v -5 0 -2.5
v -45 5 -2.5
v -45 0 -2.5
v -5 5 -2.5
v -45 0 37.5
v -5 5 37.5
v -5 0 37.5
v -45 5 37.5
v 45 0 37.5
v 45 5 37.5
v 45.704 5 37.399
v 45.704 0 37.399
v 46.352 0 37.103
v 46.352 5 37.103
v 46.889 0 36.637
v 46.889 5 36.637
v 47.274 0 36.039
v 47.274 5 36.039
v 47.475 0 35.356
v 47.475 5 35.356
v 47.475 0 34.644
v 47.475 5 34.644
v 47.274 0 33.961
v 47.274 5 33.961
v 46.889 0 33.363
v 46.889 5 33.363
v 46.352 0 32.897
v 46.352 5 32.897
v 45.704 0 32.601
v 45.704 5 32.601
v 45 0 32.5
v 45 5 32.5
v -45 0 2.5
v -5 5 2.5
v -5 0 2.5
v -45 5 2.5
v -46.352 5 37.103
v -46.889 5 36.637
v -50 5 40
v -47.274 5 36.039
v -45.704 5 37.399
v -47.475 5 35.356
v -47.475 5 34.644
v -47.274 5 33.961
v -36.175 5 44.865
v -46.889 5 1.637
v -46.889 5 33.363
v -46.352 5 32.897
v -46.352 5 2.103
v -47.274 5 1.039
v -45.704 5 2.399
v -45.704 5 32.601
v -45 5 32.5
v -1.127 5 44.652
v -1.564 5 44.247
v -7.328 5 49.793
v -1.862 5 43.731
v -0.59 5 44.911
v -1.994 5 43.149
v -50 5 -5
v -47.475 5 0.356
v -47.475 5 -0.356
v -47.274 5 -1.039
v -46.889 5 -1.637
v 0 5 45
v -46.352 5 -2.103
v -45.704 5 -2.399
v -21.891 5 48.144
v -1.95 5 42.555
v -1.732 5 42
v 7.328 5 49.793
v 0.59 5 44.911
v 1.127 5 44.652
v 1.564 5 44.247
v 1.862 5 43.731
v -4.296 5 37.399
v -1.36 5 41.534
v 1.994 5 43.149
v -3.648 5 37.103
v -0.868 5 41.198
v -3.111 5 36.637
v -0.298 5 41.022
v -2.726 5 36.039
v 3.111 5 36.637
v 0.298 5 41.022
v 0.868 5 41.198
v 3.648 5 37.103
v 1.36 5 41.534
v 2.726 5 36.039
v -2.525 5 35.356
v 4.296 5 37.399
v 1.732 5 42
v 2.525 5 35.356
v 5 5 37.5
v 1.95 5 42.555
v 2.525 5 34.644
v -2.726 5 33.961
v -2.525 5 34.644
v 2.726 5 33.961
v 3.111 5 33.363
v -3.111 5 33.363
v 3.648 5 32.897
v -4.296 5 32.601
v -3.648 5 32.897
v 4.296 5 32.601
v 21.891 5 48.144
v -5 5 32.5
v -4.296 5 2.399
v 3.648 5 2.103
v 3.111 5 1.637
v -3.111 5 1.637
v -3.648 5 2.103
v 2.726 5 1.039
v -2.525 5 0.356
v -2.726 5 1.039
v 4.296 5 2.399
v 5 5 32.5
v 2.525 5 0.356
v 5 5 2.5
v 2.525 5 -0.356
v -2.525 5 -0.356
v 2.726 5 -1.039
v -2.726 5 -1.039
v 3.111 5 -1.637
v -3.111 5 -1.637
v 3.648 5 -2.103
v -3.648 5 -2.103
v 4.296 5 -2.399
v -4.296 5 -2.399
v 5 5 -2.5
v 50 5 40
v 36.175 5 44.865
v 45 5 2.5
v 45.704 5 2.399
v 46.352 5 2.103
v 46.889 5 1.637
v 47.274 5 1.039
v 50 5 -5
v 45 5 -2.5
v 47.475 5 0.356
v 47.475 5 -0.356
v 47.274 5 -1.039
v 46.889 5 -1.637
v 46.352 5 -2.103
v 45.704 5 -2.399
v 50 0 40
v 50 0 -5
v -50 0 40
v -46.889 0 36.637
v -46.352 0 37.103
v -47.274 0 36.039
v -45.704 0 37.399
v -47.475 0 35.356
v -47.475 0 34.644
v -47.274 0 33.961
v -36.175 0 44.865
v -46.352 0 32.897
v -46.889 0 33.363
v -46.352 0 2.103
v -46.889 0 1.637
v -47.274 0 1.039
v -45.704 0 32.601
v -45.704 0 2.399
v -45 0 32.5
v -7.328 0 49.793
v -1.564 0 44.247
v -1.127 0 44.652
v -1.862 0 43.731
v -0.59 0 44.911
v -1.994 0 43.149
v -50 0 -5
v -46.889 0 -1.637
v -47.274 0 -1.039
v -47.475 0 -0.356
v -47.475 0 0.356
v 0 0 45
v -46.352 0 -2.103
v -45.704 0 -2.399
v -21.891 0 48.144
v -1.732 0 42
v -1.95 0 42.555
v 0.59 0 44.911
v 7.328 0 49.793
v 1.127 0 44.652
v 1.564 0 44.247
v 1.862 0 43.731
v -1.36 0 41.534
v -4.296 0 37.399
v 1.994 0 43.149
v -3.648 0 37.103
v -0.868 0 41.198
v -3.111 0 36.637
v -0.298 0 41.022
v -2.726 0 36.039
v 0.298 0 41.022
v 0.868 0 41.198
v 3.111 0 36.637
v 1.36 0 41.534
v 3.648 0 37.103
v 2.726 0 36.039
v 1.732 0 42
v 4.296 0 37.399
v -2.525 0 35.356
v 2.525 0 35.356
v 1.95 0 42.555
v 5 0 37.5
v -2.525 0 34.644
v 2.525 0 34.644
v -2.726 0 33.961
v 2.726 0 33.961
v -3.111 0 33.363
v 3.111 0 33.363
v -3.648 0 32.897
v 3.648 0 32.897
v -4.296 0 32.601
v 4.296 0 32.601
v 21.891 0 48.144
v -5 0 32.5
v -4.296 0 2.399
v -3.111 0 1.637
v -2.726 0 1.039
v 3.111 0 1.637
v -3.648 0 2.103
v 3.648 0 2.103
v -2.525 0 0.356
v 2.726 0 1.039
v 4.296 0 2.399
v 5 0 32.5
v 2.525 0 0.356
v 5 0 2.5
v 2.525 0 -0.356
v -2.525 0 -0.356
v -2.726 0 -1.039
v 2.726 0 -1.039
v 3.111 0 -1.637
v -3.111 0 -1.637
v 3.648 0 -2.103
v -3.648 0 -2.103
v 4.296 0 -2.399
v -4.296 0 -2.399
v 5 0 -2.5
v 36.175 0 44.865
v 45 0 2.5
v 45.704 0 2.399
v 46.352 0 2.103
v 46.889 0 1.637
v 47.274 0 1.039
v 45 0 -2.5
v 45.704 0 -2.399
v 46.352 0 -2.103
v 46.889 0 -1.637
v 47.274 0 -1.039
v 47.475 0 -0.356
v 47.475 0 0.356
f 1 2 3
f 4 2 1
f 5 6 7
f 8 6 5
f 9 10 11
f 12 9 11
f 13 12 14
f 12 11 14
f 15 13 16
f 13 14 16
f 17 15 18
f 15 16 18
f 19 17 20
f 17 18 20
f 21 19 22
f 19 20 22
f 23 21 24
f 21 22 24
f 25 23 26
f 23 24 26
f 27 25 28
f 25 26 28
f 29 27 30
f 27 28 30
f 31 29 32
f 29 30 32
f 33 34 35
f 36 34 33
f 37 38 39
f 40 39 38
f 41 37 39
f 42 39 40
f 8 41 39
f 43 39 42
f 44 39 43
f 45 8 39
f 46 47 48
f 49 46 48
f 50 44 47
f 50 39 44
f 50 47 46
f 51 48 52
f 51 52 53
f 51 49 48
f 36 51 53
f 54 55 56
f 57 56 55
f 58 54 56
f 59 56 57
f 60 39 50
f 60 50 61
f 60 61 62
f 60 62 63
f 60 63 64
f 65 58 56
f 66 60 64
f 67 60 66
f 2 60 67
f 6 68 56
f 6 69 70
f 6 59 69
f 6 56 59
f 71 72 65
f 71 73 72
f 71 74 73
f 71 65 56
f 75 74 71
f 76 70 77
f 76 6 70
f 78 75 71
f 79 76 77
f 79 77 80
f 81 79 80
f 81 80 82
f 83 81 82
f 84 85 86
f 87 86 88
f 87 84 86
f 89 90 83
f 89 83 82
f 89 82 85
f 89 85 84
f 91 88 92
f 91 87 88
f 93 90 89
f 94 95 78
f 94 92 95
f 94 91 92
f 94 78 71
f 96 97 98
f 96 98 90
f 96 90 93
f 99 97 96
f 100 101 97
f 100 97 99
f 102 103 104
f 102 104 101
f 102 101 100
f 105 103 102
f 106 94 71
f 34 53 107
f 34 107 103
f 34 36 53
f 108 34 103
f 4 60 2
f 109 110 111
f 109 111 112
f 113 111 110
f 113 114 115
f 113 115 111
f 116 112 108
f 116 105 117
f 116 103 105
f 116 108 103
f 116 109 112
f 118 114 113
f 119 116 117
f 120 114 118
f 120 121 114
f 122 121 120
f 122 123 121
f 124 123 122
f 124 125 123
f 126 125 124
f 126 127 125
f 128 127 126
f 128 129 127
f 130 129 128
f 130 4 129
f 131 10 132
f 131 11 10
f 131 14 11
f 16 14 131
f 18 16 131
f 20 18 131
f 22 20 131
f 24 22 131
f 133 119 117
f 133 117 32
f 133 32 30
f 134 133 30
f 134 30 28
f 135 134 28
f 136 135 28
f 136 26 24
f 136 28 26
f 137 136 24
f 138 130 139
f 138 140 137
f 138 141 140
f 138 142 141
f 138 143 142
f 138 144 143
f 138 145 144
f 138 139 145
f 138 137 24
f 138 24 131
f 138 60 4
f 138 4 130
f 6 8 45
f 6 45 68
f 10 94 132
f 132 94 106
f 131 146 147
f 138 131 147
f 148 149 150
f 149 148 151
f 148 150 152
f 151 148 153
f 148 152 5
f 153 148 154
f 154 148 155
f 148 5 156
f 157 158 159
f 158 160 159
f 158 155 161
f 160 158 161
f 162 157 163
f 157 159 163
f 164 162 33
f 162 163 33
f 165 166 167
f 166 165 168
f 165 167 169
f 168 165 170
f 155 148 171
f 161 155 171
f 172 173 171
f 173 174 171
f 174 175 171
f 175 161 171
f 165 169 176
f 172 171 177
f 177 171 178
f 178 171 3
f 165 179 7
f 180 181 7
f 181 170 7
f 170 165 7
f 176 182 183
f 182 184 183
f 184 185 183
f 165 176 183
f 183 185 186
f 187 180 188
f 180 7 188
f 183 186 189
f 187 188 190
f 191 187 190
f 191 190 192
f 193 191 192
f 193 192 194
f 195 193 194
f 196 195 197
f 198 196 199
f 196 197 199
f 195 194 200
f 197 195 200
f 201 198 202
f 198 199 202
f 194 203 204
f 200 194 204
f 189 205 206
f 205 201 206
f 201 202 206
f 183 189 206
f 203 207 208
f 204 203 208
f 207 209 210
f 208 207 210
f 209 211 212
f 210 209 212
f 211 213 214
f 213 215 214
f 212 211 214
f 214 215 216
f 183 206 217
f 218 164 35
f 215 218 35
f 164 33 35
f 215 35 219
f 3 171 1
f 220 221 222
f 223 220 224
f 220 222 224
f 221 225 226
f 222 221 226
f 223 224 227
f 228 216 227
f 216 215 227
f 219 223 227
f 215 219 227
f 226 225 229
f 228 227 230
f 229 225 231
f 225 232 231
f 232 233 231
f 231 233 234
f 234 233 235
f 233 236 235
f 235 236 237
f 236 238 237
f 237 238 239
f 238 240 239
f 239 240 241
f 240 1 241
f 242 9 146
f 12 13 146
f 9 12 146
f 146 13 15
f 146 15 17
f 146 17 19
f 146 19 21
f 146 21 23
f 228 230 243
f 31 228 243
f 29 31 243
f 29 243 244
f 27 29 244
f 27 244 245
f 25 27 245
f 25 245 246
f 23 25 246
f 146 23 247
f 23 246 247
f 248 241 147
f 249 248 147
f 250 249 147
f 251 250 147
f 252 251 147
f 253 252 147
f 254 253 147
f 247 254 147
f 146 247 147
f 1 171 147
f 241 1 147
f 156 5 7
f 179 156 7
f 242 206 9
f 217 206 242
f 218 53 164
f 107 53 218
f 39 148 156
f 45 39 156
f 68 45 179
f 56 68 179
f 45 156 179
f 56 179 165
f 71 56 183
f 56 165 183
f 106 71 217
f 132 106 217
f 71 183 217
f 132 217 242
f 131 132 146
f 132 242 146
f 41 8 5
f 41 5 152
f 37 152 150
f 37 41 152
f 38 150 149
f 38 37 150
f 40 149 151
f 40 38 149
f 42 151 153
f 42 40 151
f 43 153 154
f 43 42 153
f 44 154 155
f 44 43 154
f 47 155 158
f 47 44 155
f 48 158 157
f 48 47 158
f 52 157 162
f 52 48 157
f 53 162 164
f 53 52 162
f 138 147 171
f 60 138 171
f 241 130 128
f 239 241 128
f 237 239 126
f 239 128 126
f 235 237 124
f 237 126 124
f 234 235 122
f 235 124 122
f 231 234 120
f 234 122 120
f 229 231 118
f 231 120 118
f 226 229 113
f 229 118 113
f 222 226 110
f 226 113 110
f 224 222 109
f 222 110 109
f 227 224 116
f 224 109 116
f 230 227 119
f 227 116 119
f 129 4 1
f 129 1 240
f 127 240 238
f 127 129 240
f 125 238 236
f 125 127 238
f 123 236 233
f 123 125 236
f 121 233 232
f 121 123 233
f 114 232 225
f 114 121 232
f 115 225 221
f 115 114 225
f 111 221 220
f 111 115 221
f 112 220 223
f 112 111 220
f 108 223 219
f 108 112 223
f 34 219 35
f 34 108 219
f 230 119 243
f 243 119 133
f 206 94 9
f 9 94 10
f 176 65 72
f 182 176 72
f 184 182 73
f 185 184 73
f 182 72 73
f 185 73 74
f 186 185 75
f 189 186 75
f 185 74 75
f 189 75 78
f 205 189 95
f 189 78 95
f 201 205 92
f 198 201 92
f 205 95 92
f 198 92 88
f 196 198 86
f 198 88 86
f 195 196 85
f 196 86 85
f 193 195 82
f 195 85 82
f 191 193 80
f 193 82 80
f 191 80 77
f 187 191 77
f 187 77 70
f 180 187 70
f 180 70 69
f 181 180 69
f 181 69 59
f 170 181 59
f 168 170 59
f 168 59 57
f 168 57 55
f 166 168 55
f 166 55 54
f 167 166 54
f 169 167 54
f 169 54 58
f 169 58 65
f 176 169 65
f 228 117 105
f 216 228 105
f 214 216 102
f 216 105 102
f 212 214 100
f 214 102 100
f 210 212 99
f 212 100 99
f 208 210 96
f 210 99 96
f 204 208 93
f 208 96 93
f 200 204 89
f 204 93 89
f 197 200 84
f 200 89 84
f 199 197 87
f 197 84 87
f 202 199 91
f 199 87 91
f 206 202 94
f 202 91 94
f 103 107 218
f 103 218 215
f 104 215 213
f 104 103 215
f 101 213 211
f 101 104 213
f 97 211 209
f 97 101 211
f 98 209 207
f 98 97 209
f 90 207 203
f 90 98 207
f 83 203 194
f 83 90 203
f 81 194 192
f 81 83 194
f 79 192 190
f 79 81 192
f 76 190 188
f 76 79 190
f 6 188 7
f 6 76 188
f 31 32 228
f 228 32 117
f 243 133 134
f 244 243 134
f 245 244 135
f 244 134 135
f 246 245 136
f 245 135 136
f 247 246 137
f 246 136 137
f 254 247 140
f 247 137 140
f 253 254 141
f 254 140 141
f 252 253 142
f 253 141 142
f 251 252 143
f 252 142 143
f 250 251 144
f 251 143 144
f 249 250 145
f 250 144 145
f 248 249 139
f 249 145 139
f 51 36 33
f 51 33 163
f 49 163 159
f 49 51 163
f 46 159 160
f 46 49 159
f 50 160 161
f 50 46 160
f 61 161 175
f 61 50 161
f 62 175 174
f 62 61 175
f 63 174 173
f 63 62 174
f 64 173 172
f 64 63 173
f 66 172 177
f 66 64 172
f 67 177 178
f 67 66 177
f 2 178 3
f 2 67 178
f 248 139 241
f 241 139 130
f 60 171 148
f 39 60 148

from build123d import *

# Parameters (mm, degrees)
BOSS_EXTRUDE1_DEPTH = 5
CUT_EXTRUDE1_REACH  = 72.887
CUT_EXTRUDE2_REACH  = 72.887
SKETCH3_R           = 2


with BuildPart() as part:
    # Sketch1 → Boss-Extrude1 (new body)
    with BuildSketch(Plane(origin=(0, 0, 0), x_dir=(1, 0, 0), z_dir=(0, 1, 0))):
        with BuildLine():
            Line((50, -40), (50, 5))
            Line((50, 5), (-50, 5))
            Line((-50, 5), (-50, -40))
            ThreePointArc((-50, -40), (0, -50), (50, -40))
        make_face()
    extrude(amount=BOSS_EXTRUDE1_DEPTH)

    # Sketch2 → Cut-Extrude1 (cut, up to next)
    with BuildSketch(Plane(origin=(0, 5, 0), x_dir=(1, 0, 0), z_dir=(0, 1, 0)), mode=Mode.PRIVATE) as cut_extrude1_sk1:
        with BuildLine():
            Line((-45, -32.5), (-5, -32.5))
            ThreePointArc((-5, -32.5), (-2.5, -35), (-5, -37.5))
            Line((-5, -37.5), (-45, -37.5))
            ThreePointArc((-45, -37.5), (-47.5, -35), (-45, -32.5))
        make_face()
    cut_extrude1_tool1 = extrude(cut_extrude1_sk1.sketch, amount=-CUT_EXTRUDE1_REACH, mode=Mode.PRIVATE) & part.part
    # Sketch2 → Cut-Extrude1 (cut, up to next)
    with BuildSketch(Plane(origin=(0, 5, 0), x_dir=(1, 0, 0), z_dir=(0, 1, 0)), mode=Mode.PRIVATE) as cut_extrude1_sk2:
        with BuildLine():
            Line((-45, 2.5), (-5, 2.5))
            ThreePointArc((-5, 2.5), (-2.5, 0), (-5, -2.5))
            Line((-5, -2.5), (-45, -2.5))
            ThreePointArc((-45, -2.5), (-47.5, 0), (-45, 2.5))
        make_face()
    cut_extrude1_tool2 = extrude(cut_extrude1_sk2.sketch, amount=-CUT_EXTRUDE1_REACH, mode=Mode.PRIVATE) & part.part
    cut_extrude1_1 = cut_extrude1_tool1.solids().sort_by_distance((-25, 5, 35))[0]
    add(cut_extrude1_1, mode=Mode.SUBTRACT)
    cut_extrude1_2 = cut_extrude1_tool2.solids().sort_by_distance((-25, 5, 0))[0]
    add(cut_extrude1_2, mode=Mode.SUBTRACT)
    cut_extrude1 = cut_extrude1_1 + cut_extrude1_2  # Cut-Extrude1 as one shape, for the pattern or mirror that repeats it

    # Mirror1: Cut-Extrude1 across plane
    add(cut_extrude1.mirror(Plane(origin=(0, 0, 0), x_dir=(0, 0, 1), z_dir=(1, 0, 0))), mode=Mode.SUBTRACT)

    # Sketch3 → Cut-Extrude2 (cut, up to next)
    with BuildSketch(Plane(origin=(0, 5, 0), x_dir=(1, 0, 0), z_dir=(0, 1, 0)), mode=Mode.PRIVATE) as cut_extrude2_sk1:
        with Locations(Location((0, -43, 0), (0, 0, 270))):
            Circle(SKETCH3_R)
    cut_extrude2_tool1 = extrude(cut_extrude2_sk1.sketch, amount=-CUT_EXTRUDE2_REACH, mode=Mode.PRIVATE) & part.part
    add(cut_extrude2_tool1.solids().sort_by_distance((0, 5, 43))[0], mode=Mode.SUBTRACT)


solid = part.part
